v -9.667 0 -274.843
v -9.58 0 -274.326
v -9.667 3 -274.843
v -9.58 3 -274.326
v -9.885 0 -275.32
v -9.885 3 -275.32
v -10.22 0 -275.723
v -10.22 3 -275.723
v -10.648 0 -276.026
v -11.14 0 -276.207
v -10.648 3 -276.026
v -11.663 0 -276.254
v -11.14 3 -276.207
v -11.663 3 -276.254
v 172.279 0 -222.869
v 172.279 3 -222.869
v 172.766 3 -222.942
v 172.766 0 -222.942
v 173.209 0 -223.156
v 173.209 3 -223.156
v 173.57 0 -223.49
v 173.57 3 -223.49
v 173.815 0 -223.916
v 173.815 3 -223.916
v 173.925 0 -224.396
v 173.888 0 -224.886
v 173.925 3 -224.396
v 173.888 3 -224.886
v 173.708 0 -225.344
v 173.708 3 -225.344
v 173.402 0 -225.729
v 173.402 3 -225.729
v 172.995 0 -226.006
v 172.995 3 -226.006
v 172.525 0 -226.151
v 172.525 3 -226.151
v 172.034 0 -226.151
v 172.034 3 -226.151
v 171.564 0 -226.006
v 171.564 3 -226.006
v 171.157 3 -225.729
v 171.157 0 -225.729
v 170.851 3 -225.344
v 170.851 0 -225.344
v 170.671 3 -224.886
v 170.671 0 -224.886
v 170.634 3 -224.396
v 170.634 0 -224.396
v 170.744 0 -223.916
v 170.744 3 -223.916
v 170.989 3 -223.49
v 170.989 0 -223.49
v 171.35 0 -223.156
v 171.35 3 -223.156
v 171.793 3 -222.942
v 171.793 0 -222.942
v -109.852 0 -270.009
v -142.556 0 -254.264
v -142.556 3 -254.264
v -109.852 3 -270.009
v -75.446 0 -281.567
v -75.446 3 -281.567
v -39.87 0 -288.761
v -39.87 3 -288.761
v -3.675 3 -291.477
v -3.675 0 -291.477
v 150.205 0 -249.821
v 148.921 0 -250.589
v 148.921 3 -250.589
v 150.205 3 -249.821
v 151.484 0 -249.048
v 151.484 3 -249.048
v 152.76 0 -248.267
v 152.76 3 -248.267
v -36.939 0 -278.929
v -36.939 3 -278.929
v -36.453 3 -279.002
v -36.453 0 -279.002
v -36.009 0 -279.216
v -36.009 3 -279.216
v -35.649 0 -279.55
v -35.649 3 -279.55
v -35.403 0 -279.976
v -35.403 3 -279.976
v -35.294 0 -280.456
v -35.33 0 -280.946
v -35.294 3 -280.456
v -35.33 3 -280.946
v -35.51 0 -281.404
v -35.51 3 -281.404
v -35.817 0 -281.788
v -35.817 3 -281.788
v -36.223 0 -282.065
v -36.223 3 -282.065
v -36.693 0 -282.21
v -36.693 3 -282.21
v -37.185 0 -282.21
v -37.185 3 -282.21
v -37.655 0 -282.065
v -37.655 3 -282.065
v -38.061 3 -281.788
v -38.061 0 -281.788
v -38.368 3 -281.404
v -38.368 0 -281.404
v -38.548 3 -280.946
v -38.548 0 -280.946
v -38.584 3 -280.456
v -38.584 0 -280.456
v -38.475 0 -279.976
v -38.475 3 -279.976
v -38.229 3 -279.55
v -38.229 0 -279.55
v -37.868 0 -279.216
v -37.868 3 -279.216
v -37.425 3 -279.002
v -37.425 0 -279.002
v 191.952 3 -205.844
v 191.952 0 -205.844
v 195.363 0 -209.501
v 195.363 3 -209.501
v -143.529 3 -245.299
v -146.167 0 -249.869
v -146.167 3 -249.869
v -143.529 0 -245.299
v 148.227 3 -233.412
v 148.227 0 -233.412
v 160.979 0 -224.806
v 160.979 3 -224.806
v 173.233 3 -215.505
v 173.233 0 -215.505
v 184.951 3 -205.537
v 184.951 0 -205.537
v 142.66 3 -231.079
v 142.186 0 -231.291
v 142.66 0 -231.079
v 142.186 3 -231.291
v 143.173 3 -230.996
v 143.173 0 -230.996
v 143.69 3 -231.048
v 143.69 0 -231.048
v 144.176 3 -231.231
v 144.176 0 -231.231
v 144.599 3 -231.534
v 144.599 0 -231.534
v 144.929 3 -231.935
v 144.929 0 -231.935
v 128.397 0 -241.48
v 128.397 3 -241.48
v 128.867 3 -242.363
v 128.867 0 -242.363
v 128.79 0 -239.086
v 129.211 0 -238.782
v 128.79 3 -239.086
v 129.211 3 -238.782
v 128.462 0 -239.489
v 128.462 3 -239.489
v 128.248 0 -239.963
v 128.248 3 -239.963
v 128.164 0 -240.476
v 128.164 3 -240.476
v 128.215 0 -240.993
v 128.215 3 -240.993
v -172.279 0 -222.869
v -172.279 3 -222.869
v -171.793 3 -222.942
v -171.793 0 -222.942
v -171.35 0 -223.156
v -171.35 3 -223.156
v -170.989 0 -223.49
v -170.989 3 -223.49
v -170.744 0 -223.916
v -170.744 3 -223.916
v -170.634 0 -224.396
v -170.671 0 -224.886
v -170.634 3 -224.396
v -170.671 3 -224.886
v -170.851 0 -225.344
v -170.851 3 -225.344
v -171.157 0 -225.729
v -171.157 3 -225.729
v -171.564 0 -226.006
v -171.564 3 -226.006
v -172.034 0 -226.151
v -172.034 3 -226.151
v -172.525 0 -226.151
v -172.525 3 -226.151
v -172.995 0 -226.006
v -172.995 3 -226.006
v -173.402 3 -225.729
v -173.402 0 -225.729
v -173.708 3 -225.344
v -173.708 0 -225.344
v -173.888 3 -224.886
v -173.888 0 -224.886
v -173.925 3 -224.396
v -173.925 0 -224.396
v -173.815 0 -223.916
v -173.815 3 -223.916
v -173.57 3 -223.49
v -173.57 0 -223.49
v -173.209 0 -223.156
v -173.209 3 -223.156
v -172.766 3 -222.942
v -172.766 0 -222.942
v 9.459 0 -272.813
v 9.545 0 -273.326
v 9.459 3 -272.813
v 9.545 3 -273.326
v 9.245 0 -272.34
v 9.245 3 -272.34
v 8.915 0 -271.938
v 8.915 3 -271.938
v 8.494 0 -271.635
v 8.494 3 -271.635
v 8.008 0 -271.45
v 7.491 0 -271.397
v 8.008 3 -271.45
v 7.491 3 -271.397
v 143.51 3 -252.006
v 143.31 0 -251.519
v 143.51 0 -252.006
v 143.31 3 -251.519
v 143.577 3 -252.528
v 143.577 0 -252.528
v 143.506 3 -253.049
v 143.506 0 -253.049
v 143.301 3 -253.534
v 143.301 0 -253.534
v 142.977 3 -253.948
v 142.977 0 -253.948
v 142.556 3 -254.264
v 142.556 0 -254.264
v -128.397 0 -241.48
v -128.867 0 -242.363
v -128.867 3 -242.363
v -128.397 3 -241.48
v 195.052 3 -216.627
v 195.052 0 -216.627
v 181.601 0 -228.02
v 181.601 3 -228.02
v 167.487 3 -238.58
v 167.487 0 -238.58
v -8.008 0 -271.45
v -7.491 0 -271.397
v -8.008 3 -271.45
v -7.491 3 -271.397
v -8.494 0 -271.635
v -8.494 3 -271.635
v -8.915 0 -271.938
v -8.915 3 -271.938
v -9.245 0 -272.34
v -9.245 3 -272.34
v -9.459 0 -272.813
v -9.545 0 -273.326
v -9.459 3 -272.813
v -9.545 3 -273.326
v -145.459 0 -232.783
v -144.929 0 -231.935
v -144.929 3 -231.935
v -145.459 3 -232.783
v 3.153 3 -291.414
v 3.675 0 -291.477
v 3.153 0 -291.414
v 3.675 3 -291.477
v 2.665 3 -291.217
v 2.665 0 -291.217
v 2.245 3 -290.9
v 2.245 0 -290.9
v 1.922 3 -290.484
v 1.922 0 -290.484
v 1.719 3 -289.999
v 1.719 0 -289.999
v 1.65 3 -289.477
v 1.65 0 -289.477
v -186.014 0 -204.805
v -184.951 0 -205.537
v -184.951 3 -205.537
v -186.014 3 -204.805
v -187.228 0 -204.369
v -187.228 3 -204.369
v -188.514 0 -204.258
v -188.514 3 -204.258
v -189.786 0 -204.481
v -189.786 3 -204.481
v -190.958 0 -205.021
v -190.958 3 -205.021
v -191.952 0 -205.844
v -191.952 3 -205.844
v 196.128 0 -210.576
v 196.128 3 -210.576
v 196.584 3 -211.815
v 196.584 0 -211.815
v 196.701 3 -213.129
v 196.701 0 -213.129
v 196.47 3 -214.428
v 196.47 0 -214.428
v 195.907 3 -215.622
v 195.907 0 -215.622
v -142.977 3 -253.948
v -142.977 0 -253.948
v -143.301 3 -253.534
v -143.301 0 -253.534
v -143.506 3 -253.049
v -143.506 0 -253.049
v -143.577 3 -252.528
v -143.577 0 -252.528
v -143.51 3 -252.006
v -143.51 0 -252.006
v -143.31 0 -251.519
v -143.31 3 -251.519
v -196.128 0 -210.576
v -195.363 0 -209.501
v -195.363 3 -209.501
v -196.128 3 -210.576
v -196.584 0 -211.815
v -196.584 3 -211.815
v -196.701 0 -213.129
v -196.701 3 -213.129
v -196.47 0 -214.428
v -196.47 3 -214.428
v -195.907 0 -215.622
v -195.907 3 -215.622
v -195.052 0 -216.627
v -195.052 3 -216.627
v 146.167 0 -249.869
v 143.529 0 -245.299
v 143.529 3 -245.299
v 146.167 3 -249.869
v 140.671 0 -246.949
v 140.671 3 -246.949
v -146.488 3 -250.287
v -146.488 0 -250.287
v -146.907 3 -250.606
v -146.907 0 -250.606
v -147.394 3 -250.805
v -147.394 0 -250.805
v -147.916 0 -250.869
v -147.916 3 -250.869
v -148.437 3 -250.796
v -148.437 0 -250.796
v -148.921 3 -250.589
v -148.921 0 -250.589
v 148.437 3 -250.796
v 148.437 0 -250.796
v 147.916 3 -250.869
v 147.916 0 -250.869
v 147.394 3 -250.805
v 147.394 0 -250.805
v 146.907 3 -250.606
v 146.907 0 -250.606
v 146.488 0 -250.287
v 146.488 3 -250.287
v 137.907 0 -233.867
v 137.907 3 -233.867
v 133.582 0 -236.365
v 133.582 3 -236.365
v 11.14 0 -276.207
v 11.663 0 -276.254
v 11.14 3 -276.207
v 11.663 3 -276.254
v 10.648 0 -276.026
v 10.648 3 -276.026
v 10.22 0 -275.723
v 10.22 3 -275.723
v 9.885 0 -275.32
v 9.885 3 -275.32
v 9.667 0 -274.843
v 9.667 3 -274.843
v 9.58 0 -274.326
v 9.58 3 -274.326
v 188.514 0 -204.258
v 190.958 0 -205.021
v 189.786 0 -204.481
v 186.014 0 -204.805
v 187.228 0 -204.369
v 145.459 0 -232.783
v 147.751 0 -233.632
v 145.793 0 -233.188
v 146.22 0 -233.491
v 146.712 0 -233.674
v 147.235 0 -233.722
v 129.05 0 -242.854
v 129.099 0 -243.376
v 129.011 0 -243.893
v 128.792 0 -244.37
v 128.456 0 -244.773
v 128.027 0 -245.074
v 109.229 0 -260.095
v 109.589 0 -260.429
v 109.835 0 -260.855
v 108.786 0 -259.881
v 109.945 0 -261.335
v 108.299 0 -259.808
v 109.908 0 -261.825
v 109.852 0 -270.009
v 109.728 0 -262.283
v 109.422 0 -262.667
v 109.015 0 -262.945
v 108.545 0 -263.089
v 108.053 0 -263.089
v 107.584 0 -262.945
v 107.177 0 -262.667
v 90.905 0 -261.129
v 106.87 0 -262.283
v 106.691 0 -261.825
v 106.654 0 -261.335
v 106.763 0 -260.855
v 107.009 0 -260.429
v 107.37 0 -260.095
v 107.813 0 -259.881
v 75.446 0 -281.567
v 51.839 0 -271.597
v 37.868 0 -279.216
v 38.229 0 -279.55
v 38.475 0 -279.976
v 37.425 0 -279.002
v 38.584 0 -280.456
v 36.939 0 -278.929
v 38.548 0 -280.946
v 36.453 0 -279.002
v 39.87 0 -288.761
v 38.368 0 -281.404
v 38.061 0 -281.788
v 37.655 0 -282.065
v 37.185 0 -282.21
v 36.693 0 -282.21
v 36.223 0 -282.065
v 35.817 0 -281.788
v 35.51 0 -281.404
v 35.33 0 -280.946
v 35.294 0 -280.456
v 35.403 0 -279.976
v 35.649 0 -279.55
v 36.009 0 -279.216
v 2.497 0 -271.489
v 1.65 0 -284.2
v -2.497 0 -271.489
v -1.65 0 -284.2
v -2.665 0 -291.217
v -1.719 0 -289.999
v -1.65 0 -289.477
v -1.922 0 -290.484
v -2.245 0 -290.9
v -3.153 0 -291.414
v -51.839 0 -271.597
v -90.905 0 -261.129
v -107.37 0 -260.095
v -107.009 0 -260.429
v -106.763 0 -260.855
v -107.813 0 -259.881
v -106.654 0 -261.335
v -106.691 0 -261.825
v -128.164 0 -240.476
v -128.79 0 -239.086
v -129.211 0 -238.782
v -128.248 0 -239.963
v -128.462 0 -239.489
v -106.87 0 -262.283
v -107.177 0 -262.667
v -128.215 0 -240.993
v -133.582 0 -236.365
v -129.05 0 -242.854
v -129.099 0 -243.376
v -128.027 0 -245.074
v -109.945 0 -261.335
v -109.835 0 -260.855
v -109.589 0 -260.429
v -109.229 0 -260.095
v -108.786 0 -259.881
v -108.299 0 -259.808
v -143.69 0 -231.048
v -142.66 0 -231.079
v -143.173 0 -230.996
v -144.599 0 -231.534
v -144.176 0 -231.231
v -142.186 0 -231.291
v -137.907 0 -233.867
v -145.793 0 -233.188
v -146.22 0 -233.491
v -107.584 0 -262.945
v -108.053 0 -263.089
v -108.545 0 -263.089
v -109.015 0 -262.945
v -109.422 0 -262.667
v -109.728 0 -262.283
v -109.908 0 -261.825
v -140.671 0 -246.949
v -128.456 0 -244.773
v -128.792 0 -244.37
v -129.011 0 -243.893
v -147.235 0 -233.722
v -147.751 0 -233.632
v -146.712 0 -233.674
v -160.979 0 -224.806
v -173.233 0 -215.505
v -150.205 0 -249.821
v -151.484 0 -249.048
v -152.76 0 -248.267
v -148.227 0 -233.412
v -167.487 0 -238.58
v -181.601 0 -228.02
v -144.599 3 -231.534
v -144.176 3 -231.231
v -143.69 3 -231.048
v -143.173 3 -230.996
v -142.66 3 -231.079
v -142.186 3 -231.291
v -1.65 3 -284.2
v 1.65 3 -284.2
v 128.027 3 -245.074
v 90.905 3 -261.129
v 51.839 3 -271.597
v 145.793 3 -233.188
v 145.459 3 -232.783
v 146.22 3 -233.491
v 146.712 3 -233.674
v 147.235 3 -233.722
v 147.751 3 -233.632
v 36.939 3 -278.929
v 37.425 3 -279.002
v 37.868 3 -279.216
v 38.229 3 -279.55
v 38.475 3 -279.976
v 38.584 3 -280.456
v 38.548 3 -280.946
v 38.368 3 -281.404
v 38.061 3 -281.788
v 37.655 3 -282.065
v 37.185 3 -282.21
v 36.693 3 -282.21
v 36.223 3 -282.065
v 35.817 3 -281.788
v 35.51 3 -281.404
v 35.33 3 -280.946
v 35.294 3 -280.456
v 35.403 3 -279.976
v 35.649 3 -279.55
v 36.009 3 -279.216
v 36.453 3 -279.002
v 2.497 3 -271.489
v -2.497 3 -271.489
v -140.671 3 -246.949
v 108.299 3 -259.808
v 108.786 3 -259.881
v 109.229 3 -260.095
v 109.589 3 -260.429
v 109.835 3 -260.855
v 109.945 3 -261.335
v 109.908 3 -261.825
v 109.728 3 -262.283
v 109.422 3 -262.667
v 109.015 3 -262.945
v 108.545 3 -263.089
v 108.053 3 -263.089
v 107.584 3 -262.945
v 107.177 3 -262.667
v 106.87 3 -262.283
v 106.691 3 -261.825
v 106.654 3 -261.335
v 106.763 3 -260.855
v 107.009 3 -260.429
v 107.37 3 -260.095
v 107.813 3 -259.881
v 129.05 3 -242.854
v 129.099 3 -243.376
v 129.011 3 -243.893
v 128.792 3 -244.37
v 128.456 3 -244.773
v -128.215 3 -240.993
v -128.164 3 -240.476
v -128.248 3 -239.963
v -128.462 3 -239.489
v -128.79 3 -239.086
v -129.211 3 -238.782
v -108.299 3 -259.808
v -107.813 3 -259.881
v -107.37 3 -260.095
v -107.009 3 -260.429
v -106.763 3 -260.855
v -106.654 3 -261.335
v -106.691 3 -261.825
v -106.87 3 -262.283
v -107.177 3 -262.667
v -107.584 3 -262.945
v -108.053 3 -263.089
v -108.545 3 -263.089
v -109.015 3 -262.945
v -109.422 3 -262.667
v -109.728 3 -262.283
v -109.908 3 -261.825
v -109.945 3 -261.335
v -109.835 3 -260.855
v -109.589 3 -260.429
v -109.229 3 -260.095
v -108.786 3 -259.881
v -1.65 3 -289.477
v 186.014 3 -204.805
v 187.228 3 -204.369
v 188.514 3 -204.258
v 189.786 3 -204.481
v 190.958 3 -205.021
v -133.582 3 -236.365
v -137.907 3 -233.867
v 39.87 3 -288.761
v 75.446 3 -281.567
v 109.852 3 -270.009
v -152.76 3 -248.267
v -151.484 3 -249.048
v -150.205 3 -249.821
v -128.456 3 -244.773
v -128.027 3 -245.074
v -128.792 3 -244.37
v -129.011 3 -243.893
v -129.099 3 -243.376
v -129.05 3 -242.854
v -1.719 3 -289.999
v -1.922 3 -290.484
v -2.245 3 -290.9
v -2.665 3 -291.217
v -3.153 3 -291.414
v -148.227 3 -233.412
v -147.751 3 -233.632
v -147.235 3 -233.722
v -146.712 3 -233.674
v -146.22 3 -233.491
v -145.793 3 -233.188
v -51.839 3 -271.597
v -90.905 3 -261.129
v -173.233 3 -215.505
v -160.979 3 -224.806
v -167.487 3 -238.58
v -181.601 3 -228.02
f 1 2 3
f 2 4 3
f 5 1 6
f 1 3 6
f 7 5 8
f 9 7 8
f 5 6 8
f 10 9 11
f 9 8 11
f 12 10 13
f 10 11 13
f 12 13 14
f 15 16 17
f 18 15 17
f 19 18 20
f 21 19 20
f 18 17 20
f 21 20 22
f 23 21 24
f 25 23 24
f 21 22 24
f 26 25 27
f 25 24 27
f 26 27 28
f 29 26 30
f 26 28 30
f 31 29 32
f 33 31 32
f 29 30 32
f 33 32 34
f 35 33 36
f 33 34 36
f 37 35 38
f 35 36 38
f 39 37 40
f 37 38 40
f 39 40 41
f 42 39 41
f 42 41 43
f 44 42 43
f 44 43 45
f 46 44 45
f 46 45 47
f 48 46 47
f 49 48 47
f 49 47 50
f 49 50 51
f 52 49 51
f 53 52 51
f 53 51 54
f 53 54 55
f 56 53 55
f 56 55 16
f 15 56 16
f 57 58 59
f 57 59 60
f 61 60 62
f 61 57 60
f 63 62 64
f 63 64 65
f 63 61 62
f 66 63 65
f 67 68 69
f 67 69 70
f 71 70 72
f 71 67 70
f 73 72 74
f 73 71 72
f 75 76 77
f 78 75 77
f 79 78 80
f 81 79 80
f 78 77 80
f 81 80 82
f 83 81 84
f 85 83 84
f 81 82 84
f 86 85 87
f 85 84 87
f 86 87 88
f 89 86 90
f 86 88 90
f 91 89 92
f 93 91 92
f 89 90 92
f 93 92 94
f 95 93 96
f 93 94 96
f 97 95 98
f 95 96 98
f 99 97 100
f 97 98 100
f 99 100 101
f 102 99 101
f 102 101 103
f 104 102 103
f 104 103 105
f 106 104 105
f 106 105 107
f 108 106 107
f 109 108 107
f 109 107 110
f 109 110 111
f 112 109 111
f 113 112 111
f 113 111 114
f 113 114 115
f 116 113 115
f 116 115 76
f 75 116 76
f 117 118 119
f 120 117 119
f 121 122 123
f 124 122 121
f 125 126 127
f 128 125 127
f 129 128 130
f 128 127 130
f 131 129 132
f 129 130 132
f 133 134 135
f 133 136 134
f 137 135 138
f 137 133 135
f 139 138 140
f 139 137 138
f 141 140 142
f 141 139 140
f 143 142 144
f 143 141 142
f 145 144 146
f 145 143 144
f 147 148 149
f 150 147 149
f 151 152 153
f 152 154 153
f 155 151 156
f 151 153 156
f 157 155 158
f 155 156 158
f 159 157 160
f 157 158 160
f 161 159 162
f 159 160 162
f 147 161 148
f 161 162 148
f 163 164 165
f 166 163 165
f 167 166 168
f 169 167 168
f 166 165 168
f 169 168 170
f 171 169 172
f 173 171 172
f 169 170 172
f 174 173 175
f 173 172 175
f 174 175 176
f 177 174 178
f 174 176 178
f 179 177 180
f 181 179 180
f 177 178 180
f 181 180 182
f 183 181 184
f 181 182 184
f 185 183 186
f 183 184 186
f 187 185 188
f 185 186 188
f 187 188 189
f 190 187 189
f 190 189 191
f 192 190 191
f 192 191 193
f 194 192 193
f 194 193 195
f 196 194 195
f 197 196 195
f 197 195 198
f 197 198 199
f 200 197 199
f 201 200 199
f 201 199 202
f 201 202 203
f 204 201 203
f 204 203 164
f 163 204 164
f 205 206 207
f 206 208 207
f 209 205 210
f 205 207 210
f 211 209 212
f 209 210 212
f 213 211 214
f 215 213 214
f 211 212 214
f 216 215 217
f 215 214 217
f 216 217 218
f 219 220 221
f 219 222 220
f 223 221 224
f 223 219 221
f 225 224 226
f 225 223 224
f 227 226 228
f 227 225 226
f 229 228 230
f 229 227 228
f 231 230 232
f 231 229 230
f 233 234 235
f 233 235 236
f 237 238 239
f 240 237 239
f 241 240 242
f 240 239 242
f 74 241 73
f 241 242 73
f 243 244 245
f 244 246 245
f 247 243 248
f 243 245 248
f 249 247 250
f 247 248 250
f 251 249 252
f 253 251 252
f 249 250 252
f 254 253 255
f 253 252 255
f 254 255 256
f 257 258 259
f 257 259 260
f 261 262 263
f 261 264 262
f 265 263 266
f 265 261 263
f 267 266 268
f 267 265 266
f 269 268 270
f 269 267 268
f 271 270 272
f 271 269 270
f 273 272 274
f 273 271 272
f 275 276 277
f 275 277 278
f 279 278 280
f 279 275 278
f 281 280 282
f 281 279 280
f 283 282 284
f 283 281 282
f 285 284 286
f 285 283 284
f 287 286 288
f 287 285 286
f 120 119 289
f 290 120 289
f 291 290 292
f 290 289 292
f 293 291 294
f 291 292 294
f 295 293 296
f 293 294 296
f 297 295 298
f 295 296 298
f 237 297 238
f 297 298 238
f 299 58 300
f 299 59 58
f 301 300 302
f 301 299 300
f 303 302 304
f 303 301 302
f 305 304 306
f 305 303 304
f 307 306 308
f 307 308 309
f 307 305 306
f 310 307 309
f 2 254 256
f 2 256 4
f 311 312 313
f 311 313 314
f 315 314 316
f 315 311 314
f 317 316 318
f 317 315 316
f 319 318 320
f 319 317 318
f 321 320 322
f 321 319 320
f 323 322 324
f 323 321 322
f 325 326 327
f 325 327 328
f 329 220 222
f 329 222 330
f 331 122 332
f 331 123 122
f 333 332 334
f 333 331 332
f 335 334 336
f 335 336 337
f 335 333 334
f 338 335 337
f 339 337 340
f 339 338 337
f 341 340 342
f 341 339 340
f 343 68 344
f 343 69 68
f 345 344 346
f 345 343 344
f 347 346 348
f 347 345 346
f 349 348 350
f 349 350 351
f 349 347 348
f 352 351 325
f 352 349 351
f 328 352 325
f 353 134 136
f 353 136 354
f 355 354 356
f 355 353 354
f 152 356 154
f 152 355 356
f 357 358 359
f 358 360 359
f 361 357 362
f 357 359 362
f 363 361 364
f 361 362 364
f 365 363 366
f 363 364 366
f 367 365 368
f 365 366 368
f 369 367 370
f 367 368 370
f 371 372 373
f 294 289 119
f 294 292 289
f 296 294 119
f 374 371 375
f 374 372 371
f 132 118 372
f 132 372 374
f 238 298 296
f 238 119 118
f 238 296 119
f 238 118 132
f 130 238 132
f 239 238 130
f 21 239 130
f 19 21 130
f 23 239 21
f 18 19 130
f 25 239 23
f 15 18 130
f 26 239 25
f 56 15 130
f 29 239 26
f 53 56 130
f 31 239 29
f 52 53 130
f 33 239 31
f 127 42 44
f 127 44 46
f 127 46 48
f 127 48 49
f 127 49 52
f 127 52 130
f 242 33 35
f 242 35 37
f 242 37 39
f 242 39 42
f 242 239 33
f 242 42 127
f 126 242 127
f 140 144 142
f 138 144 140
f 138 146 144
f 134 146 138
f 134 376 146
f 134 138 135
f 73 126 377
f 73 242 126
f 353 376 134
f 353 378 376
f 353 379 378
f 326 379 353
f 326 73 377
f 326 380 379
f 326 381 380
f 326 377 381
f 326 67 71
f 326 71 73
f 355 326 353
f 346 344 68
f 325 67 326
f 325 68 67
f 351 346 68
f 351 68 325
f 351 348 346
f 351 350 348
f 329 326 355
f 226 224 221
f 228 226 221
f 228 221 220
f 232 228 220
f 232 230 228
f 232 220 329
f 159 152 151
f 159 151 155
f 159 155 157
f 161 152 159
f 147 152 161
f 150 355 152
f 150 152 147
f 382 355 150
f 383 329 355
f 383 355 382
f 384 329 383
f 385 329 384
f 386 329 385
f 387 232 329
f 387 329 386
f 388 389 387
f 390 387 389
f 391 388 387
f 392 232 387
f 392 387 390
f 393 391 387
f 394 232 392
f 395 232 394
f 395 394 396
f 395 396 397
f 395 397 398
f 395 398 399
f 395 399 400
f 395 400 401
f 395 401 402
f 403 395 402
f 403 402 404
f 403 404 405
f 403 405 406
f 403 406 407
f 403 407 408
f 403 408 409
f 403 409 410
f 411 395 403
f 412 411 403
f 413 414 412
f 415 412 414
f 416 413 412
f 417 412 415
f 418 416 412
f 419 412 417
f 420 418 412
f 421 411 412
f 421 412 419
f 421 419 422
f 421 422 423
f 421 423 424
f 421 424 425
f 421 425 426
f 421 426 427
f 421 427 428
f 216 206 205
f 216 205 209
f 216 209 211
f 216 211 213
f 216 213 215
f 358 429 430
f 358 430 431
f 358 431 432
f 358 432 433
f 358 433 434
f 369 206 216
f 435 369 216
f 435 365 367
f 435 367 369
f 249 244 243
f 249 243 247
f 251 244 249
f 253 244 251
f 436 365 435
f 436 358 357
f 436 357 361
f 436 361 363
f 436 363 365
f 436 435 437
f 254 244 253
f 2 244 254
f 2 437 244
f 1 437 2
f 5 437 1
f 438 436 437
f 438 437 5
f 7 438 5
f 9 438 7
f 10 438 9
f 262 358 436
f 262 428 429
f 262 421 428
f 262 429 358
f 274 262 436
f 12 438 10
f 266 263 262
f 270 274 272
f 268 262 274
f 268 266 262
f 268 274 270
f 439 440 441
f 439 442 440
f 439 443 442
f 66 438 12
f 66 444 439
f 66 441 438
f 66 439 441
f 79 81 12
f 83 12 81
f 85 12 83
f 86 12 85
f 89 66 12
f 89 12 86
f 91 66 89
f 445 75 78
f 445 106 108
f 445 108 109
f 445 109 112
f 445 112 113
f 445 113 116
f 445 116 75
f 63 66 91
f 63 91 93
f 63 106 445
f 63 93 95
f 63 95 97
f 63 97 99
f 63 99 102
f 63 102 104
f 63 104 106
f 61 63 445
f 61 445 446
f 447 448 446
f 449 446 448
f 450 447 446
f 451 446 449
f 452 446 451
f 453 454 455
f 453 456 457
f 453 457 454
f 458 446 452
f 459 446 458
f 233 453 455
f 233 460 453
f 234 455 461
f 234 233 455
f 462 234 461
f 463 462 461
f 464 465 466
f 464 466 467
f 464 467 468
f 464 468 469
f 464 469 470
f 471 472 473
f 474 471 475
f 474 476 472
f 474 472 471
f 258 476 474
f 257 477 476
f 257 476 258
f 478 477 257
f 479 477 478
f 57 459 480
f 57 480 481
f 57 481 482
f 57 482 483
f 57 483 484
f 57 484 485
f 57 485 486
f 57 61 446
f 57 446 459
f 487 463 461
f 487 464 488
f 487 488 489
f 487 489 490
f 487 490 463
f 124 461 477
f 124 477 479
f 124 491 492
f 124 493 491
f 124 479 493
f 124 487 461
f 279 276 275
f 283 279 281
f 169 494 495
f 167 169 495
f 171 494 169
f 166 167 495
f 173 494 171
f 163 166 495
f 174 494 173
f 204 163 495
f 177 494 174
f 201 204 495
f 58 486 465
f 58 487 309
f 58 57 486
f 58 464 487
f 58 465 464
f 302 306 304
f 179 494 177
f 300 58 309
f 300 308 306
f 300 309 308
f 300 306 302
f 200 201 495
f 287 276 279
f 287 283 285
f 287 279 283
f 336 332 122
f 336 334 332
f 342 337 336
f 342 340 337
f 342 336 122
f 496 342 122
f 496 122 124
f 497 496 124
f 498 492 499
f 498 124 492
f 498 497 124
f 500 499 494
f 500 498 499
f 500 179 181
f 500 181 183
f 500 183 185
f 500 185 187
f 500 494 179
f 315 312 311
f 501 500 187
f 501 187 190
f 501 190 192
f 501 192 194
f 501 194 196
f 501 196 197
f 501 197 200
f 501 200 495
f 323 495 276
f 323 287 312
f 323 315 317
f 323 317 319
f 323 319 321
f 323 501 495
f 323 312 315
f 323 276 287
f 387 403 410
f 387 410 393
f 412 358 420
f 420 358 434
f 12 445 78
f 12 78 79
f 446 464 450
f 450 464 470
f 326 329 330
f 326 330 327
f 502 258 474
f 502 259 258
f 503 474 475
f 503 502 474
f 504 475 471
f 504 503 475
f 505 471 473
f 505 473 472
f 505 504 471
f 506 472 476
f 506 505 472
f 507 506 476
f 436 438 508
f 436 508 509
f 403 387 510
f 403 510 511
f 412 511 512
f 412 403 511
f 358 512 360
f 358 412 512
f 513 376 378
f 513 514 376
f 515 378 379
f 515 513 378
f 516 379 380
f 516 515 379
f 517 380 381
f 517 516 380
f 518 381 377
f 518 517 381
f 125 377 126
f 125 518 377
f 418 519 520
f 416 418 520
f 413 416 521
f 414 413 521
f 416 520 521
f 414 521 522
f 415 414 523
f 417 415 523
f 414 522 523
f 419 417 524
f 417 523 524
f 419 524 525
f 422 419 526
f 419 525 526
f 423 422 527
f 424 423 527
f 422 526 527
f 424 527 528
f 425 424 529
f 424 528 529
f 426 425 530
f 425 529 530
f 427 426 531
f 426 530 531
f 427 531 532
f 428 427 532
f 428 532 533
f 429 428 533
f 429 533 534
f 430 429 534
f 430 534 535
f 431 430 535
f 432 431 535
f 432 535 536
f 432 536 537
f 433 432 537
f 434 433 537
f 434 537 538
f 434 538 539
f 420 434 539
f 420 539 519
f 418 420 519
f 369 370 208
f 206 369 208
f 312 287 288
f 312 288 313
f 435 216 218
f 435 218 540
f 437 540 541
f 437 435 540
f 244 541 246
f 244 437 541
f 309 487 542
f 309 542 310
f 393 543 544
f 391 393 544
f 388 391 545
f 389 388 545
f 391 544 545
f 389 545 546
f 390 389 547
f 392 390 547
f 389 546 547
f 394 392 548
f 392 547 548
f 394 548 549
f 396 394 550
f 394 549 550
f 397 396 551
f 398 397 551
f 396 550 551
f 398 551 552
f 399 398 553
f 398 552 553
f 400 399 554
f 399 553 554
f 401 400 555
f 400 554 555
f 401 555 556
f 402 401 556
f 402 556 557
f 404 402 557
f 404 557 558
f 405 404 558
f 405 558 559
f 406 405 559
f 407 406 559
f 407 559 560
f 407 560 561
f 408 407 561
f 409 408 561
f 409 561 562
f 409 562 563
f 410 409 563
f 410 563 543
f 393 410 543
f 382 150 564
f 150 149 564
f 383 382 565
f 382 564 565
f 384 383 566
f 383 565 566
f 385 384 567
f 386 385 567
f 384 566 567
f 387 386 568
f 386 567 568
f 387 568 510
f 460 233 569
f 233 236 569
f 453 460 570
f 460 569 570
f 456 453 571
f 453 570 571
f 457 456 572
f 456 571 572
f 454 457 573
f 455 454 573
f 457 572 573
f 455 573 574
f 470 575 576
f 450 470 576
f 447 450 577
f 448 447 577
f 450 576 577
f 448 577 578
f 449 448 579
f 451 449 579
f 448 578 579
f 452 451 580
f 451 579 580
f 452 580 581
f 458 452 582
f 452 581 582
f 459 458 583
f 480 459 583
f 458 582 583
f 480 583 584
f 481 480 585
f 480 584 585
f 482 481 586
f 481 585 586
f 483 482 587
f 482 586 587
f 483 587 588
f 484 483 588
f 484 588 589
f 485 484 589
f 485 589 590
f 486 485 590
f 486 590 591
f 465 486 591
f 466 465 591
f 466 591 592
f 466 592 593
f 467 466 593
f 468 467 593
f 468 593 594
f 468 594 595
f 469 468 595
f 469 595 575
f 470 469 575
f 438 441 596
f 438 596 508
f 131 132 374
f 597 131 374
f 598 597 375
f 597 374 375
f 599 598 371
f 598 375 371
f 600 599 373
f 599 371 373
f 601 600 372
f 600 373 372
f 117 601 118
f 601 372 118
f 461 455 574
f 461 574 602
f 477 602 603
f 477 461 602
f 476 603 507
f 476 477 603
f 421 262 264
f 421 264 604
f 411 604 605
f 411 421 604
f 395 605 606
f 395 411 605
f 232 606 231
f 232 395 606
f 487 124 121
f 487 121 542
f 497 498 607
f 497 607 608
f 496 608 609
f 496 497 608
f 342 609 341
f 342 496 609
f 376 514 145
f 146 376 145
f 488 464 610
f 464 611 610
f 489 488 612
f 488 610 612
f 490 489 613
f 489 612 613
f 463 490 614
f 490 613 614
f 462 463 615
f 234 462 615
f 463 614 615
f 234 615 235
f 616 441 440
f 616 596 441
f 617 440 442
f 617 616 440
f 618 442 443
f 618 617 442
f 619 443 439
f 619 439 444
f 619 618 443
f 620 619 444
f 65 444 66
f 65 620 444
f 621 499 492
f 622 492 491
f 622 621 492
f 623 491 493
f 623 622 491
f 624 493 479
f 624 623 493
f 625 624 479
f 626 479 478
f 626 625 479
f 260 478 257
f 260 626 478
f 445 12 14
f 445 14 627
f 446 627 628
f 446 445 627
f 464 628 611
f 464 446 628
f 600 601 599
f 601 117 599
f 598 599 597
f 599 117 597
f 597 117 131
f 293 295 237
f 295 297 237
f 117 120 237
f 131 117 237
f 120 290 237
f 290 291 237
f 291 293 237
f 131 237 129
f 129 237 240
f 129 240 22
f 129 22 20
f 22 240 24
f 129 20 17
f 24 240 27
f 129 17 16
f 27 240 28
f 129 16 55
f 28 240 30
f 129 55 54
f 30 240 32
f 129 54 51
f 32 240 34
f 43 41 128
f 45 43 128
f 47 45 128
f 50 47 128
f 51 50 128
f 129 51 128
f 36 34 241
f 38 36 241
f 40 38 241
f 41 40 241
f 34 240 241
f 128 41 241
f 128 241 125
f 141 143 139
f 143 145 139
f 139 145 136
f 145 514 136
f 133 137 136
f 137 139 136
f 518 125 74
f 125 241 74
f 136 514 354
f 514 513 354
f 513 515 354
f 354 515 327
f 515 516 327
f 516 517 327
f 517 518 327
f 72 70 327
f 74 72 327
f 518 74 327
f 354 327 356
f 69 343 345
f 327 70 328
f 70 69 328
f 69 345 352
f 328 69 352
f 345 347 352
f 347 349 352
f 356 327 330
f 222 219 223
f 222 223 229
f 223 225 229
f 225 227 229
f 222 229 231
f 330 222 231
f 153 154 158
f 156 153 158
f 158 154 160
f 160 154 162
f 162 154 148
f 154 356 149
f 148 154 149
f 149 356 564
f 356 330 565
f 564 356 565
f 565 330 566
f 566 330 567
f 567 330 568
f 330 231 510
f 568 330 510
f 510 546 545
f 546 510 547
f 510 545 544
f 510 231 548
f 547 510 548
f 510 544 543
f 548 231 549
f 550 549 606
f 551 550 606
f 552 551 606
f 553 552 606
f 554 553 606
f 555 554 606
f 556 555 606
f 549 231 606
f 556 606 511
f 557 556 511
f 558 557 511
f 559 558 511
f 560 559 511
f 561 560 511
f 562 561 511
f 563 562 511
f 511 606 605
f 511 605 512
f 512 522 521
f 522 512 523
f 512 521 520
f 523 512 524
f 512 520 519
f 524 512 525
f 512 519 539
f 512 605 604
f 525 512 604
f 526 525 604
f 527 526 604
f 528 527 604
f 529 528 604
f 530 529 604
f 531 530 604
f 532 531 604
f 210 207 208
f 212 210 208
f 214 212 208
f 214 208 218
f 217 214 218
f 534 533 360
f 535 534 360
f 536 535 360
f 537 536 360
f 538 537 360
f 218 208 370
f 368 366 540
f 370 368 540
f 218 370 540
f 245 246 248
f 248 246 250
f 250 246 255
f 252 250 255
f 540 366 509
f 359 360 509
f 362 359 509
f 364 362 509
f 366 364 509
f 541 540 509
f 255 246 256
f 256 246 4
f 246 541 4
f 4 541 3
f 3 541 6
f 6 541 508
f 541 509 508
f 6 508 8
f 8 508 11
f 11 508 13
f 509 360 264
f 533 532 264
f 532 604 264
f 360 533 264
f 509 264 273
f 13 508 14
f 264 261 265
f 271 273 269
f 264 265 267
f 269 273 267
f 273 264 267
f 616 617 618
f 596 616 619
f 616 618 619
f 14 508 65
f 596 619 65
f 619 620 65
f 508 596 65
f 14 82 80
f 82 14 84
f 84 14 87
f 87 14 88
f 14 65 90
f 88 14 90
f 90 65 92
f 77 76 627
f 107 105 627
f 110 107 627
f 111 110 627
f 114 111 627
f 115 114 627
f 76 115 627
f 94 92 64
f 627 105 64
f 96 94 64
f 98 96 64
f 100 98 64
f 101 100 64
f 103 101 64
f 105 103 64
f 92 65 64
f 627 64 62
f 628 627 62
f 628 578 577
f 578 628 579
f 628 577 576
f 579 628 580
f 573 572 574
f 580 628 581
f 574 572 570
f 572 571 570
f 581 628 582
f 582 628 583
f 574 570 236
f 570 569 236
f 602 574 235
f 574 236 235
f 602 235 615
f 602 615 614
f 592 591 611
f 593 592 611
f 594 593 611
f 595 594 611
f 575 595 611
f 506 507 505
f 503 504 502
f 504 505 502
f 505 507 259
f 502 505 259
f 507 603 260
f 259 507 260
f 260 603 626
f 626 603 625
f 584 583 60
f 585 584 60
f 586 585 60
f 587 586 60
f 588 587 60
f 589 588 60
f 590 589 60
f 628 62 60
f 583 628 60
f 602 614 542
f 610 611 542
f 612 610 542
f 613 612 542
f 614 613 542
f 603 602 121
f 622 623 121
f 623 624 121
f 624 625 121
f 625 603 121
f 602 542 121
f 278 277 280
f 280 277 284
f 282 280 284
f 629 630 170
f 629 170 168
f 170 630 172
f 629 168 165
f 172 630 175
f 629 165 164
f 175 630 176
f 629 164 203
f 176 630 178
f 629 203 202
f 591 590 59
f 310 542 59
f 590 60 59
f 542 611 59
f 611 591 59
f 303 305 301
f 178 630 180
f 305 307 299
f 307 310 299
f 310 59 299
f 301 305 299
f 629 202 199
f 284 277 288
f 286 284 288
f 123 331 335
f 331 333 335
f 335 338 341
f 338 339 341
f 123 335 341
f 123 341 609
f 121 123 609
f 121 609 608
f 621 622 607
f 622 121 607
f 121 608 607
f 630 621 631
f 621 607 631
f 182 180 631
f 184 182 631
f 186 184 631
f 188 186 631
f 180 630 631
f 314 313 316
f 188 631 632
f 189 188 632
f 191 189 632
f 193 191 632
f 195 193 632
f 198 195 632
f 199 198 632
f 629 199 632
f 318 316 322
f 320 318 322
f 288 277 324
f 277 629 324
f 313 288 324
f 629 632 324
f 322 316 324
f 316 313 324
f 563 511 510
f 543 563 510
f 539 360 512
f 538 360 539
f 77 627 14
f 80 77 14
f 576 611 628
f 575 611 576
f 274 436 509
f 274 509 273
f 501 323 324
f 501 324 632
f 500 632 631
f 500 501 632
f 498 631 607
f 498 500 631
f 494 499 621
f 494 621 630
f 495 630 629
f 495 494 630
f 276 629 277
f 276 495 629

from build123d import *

# Parameters (mm, degrees)
BOSS_EXTRUDE1_DEPTH = 3
FILLET1_R           = 2
FILLET2_R           = 2
FILLET3_R           = 2
BOSS_EXTRUDE2_START = -3
BOSS_EXTRUDE2_DEPTH = 3
FILLET4_R           = 2
SKETCH3_R           = 1.65
CUT_EXTRUDE1_DEPTH  = 10


with BuildPart() as part:
    # Sketch1 → Boss-Extrude1 (new body)
    with BuildSketch(Plane(origin=(0, 0, 0), x_dir=(1, 0, 0), z_dir=(0, 1, 0))):
        with BuildLine():
            Line((-147.176606992, 251.617360996), (-143.528941916, 245.299419756))
            Line((-143.528941916, 245.299419756), (-140.671058084, 246.949419756))
            Line((-140.671058084, 246.949419756), (-144.318723159, 253.267360996))
            ThreePointArc((-144.318723159, 253.267360996), (-75.445751647, 281.567378363), (-1.65, 291.495330151))
            Line((-1.65, 291.495330151), (-1.65, 284.2))
            Line((-1.65, 284.2), (1.65, 284.2))
            Line((1.65, 284.2), (1.65, 291.495330151))
            ThreePointArc((1.65, 291.495330151), (75.445751647, 281.567378363), (144.318723159, 253.267360996))
            Line((144.318723159, 253.267360996), (140.671058084, 246.949419756))
            Line((140.671058084, 246.949419756), (143.528941916, 245.299419756))
            Line((143.528941916, 245.299419756), (147.176606992, 251.617360996))
            ThreePointArc((147.176606992, 251.617360996), (150.840163403, 249.438359329), (154.471465524, 247.20602003))
            Line((154.471465524, 247.20602003), (143.873080239, 230.245058106))
            ThreePointArc((143.873080239, 230.245058106), (135.75, 235.125897127), (127.461529296, 239.720271461))
            Line((127.461529296, 239.720271461), (129.80888711, 244.135009425))
            ThreePointArc((129.80888711, 244.135009425), (71.563465971, 267.078490969), (9.649710838, 276.331563671))
            Line((9.649710838, 276.331563671), (9.475213355, 271.334609536))
            ThreePointArc((9.475213355, 271.334609536), (0, 271.5), (-9.475213355, 271.334609536))
            Line((-9.475213355, 271.334609536), (-9.649710838, 276.331563671))
            ThreePointArc((-9.649710838, 276.331563671), (-71.563465971, 267.078490969), (-129.80888711, 244.135009425))
            Line((-129.80888711, 244.135009425), (-127.461529296, 239.720271461))
            ThreePointArc((-127.461529296, 239.720271461), (-135.75, 235.125897127), (-143.873080239, 230.245058106))
            Line((-143.873080239, 230.245058106), (-154.471465524, 247.20602003))
            ThreePointArc((-154.471465524, 247.20602003), (-150.840163403, 249.438359329), (-147.176606992, 251.617360996))
        make_face()
    extrude(amount=BOSS_EXTRUDE1_DEPTH)

    # Fillet1
    fillet1_edges = [part.edges().sort_by_distance(p)[0] for p in [
        (127.461529296, 1.5, -239.720271461),
        (129.80888711, 1.5, -244.135009425),
        (9.649710838, 1.5, -276.331563671),
        (9.475213355, 1.5, -271.334609536),
        (-9.475213355, 1.5, -271.334609536),
        (-9.649710838, 1.5, -276.331563671),
        (-129.80888711, 1.5, -244.135009425),
        (-127.461529296, 1.5, -239.720271461),
    ]]
    fillet(fillet1_edges, radius=FILLET1_R)

    # Fillet2
    fillet2_edges = [part.edges().sort_by_distance(p)[0] for p in [
        (154.471465524, 1.5, -247.20602003),
        (143.873080239, 1.5, -230.245058106),
        (-143.873080239, 1.5, -230.245058106),
        (-154.471465524, 1.5, -247.20602003),
    ]]
    fillet(fillet2_edges, radius=FILLET2_R)

    # Fillet3
    fillet3_edges = [part.edges().sort_by_distance(p)[0] for p in [
        (-147.176606992, 1.5, -251.617360996),
        (-144.318723159, 1.5, -253.267360996),
        (-1.65, 1.5, -291.495330151),
        (1.65, 1.5, -291.495330151),
        (144.318723159, 1.5, -253.267360996),
        (147.176606992, 1.5, -251.617360996),
    ]]
    fillet(fillet3_edges, radius=FILLET3_R)

    # Sketch2 → Boss-Extrude2 (add)
    with BuildSketch(Plane(origin=(0, 3, 0), x_dir=(1, 0, 0), z_dir=(0, 1, 0)).offset(BOSS_EXTRUDE2_START)):
        with BuildLine():
            Line((-152.759965651, 248.267281159), (-146.52267656, 234.485298587))
            ThreePointArc((-146.52267656, 234.485298587), (-166.367665138, 220.84847746), (-184.950980973, 205.536820636))
            ThreePointArc((-184.950980973, 205.536820636), (-188.514353616, 204.258373219), (-191.95225185, 205.843588702))
            Line((-191.95225185, 205.843588702), (-195.362772292, 209.500924109))
            ThreePointArc((-195.362772292, 209.500924109), (-196.701244935, 213.129011848), (-195.0516583, 216.6266387))
            ThreePointArc((-195.0516583, 216.6266387), (-174.623921622, 233.406803666), (-152.759965651, 248.267281159))
        make_face()
        with BuildLine():
            Line((191.95225185, 205.843588702), (195.362772292, 209.500924109))
            ThreePointArc((195.362772292, 209.500924109), (196.701244935, 213.129011848), (195.0516583, 216.6266387))
            ThreePointArc((195.0516583, 216.6266387), (174.623921622, 233.406803666), (152.759965651, 248.267281159))
            Line((152.759965651, 248.267281159), (146.52267656, 234.485298587))
            ThreePointArc((146.52267656, 234.485298587), (166.367665138, 220.84847746), (184.950980973, 205.536820636))
            ThreePointArc((184.950980973, 205.536820636), (188.514353616, 204.258373219), (191.95225185, 205.843588702))
        make_face()
    extrude(amount=BOSS_EXTRUDE2_DEPTH)

    # Fillet4
    fillet4_edges = [part.edges().sort_by_distance(p)[0] for p in [
        (-146.52267656, 1.5, -234.485298587),
        (146.52267656, 1.5, -234.485298587),
    ]]
    fillet(fillet4_edges, radius=FILLET4_R)

    # Sketch3 → Cut-Extrude1 (cut)
    with BuildSketch(Plane(origin=(0, 3, 0), x_dir=(1, 0, 0), z_dir=(0, 1, 0))):
        with Locations(Location((-36.938912398, 280.578895769, 0), (0, 0, 270))):
            Circle(SKETCH3_R)
        with Locations(Location((36.938912398, 280.578895769, 0), (0, 0, 270))):
            Circle(SKETCH3_R)
        with Locations(Location((108.299411359, 261.457907701, 0), (0, 0, 270))):
            Circle(SKETCH3_R)
        with Locations(Location((-108.299411359, 261.457907701, 0), (0, 0, 270))):
            Circle(SKETCH3_R)
        with Locations(Location((172.279484409, 224.518995302, 0), (0, 0, 270))):
            Circle(SKETCH3_R)
        with Locations(Location((-172.279484409, 224.518995302, 0), (0, 0, 270))):
            Circle(SKETCH3_R)
    extrude(amount=-CUT_EXTRUDE1_DEPTH, mode=Mode.SUBTRACT)


solid = part.part
